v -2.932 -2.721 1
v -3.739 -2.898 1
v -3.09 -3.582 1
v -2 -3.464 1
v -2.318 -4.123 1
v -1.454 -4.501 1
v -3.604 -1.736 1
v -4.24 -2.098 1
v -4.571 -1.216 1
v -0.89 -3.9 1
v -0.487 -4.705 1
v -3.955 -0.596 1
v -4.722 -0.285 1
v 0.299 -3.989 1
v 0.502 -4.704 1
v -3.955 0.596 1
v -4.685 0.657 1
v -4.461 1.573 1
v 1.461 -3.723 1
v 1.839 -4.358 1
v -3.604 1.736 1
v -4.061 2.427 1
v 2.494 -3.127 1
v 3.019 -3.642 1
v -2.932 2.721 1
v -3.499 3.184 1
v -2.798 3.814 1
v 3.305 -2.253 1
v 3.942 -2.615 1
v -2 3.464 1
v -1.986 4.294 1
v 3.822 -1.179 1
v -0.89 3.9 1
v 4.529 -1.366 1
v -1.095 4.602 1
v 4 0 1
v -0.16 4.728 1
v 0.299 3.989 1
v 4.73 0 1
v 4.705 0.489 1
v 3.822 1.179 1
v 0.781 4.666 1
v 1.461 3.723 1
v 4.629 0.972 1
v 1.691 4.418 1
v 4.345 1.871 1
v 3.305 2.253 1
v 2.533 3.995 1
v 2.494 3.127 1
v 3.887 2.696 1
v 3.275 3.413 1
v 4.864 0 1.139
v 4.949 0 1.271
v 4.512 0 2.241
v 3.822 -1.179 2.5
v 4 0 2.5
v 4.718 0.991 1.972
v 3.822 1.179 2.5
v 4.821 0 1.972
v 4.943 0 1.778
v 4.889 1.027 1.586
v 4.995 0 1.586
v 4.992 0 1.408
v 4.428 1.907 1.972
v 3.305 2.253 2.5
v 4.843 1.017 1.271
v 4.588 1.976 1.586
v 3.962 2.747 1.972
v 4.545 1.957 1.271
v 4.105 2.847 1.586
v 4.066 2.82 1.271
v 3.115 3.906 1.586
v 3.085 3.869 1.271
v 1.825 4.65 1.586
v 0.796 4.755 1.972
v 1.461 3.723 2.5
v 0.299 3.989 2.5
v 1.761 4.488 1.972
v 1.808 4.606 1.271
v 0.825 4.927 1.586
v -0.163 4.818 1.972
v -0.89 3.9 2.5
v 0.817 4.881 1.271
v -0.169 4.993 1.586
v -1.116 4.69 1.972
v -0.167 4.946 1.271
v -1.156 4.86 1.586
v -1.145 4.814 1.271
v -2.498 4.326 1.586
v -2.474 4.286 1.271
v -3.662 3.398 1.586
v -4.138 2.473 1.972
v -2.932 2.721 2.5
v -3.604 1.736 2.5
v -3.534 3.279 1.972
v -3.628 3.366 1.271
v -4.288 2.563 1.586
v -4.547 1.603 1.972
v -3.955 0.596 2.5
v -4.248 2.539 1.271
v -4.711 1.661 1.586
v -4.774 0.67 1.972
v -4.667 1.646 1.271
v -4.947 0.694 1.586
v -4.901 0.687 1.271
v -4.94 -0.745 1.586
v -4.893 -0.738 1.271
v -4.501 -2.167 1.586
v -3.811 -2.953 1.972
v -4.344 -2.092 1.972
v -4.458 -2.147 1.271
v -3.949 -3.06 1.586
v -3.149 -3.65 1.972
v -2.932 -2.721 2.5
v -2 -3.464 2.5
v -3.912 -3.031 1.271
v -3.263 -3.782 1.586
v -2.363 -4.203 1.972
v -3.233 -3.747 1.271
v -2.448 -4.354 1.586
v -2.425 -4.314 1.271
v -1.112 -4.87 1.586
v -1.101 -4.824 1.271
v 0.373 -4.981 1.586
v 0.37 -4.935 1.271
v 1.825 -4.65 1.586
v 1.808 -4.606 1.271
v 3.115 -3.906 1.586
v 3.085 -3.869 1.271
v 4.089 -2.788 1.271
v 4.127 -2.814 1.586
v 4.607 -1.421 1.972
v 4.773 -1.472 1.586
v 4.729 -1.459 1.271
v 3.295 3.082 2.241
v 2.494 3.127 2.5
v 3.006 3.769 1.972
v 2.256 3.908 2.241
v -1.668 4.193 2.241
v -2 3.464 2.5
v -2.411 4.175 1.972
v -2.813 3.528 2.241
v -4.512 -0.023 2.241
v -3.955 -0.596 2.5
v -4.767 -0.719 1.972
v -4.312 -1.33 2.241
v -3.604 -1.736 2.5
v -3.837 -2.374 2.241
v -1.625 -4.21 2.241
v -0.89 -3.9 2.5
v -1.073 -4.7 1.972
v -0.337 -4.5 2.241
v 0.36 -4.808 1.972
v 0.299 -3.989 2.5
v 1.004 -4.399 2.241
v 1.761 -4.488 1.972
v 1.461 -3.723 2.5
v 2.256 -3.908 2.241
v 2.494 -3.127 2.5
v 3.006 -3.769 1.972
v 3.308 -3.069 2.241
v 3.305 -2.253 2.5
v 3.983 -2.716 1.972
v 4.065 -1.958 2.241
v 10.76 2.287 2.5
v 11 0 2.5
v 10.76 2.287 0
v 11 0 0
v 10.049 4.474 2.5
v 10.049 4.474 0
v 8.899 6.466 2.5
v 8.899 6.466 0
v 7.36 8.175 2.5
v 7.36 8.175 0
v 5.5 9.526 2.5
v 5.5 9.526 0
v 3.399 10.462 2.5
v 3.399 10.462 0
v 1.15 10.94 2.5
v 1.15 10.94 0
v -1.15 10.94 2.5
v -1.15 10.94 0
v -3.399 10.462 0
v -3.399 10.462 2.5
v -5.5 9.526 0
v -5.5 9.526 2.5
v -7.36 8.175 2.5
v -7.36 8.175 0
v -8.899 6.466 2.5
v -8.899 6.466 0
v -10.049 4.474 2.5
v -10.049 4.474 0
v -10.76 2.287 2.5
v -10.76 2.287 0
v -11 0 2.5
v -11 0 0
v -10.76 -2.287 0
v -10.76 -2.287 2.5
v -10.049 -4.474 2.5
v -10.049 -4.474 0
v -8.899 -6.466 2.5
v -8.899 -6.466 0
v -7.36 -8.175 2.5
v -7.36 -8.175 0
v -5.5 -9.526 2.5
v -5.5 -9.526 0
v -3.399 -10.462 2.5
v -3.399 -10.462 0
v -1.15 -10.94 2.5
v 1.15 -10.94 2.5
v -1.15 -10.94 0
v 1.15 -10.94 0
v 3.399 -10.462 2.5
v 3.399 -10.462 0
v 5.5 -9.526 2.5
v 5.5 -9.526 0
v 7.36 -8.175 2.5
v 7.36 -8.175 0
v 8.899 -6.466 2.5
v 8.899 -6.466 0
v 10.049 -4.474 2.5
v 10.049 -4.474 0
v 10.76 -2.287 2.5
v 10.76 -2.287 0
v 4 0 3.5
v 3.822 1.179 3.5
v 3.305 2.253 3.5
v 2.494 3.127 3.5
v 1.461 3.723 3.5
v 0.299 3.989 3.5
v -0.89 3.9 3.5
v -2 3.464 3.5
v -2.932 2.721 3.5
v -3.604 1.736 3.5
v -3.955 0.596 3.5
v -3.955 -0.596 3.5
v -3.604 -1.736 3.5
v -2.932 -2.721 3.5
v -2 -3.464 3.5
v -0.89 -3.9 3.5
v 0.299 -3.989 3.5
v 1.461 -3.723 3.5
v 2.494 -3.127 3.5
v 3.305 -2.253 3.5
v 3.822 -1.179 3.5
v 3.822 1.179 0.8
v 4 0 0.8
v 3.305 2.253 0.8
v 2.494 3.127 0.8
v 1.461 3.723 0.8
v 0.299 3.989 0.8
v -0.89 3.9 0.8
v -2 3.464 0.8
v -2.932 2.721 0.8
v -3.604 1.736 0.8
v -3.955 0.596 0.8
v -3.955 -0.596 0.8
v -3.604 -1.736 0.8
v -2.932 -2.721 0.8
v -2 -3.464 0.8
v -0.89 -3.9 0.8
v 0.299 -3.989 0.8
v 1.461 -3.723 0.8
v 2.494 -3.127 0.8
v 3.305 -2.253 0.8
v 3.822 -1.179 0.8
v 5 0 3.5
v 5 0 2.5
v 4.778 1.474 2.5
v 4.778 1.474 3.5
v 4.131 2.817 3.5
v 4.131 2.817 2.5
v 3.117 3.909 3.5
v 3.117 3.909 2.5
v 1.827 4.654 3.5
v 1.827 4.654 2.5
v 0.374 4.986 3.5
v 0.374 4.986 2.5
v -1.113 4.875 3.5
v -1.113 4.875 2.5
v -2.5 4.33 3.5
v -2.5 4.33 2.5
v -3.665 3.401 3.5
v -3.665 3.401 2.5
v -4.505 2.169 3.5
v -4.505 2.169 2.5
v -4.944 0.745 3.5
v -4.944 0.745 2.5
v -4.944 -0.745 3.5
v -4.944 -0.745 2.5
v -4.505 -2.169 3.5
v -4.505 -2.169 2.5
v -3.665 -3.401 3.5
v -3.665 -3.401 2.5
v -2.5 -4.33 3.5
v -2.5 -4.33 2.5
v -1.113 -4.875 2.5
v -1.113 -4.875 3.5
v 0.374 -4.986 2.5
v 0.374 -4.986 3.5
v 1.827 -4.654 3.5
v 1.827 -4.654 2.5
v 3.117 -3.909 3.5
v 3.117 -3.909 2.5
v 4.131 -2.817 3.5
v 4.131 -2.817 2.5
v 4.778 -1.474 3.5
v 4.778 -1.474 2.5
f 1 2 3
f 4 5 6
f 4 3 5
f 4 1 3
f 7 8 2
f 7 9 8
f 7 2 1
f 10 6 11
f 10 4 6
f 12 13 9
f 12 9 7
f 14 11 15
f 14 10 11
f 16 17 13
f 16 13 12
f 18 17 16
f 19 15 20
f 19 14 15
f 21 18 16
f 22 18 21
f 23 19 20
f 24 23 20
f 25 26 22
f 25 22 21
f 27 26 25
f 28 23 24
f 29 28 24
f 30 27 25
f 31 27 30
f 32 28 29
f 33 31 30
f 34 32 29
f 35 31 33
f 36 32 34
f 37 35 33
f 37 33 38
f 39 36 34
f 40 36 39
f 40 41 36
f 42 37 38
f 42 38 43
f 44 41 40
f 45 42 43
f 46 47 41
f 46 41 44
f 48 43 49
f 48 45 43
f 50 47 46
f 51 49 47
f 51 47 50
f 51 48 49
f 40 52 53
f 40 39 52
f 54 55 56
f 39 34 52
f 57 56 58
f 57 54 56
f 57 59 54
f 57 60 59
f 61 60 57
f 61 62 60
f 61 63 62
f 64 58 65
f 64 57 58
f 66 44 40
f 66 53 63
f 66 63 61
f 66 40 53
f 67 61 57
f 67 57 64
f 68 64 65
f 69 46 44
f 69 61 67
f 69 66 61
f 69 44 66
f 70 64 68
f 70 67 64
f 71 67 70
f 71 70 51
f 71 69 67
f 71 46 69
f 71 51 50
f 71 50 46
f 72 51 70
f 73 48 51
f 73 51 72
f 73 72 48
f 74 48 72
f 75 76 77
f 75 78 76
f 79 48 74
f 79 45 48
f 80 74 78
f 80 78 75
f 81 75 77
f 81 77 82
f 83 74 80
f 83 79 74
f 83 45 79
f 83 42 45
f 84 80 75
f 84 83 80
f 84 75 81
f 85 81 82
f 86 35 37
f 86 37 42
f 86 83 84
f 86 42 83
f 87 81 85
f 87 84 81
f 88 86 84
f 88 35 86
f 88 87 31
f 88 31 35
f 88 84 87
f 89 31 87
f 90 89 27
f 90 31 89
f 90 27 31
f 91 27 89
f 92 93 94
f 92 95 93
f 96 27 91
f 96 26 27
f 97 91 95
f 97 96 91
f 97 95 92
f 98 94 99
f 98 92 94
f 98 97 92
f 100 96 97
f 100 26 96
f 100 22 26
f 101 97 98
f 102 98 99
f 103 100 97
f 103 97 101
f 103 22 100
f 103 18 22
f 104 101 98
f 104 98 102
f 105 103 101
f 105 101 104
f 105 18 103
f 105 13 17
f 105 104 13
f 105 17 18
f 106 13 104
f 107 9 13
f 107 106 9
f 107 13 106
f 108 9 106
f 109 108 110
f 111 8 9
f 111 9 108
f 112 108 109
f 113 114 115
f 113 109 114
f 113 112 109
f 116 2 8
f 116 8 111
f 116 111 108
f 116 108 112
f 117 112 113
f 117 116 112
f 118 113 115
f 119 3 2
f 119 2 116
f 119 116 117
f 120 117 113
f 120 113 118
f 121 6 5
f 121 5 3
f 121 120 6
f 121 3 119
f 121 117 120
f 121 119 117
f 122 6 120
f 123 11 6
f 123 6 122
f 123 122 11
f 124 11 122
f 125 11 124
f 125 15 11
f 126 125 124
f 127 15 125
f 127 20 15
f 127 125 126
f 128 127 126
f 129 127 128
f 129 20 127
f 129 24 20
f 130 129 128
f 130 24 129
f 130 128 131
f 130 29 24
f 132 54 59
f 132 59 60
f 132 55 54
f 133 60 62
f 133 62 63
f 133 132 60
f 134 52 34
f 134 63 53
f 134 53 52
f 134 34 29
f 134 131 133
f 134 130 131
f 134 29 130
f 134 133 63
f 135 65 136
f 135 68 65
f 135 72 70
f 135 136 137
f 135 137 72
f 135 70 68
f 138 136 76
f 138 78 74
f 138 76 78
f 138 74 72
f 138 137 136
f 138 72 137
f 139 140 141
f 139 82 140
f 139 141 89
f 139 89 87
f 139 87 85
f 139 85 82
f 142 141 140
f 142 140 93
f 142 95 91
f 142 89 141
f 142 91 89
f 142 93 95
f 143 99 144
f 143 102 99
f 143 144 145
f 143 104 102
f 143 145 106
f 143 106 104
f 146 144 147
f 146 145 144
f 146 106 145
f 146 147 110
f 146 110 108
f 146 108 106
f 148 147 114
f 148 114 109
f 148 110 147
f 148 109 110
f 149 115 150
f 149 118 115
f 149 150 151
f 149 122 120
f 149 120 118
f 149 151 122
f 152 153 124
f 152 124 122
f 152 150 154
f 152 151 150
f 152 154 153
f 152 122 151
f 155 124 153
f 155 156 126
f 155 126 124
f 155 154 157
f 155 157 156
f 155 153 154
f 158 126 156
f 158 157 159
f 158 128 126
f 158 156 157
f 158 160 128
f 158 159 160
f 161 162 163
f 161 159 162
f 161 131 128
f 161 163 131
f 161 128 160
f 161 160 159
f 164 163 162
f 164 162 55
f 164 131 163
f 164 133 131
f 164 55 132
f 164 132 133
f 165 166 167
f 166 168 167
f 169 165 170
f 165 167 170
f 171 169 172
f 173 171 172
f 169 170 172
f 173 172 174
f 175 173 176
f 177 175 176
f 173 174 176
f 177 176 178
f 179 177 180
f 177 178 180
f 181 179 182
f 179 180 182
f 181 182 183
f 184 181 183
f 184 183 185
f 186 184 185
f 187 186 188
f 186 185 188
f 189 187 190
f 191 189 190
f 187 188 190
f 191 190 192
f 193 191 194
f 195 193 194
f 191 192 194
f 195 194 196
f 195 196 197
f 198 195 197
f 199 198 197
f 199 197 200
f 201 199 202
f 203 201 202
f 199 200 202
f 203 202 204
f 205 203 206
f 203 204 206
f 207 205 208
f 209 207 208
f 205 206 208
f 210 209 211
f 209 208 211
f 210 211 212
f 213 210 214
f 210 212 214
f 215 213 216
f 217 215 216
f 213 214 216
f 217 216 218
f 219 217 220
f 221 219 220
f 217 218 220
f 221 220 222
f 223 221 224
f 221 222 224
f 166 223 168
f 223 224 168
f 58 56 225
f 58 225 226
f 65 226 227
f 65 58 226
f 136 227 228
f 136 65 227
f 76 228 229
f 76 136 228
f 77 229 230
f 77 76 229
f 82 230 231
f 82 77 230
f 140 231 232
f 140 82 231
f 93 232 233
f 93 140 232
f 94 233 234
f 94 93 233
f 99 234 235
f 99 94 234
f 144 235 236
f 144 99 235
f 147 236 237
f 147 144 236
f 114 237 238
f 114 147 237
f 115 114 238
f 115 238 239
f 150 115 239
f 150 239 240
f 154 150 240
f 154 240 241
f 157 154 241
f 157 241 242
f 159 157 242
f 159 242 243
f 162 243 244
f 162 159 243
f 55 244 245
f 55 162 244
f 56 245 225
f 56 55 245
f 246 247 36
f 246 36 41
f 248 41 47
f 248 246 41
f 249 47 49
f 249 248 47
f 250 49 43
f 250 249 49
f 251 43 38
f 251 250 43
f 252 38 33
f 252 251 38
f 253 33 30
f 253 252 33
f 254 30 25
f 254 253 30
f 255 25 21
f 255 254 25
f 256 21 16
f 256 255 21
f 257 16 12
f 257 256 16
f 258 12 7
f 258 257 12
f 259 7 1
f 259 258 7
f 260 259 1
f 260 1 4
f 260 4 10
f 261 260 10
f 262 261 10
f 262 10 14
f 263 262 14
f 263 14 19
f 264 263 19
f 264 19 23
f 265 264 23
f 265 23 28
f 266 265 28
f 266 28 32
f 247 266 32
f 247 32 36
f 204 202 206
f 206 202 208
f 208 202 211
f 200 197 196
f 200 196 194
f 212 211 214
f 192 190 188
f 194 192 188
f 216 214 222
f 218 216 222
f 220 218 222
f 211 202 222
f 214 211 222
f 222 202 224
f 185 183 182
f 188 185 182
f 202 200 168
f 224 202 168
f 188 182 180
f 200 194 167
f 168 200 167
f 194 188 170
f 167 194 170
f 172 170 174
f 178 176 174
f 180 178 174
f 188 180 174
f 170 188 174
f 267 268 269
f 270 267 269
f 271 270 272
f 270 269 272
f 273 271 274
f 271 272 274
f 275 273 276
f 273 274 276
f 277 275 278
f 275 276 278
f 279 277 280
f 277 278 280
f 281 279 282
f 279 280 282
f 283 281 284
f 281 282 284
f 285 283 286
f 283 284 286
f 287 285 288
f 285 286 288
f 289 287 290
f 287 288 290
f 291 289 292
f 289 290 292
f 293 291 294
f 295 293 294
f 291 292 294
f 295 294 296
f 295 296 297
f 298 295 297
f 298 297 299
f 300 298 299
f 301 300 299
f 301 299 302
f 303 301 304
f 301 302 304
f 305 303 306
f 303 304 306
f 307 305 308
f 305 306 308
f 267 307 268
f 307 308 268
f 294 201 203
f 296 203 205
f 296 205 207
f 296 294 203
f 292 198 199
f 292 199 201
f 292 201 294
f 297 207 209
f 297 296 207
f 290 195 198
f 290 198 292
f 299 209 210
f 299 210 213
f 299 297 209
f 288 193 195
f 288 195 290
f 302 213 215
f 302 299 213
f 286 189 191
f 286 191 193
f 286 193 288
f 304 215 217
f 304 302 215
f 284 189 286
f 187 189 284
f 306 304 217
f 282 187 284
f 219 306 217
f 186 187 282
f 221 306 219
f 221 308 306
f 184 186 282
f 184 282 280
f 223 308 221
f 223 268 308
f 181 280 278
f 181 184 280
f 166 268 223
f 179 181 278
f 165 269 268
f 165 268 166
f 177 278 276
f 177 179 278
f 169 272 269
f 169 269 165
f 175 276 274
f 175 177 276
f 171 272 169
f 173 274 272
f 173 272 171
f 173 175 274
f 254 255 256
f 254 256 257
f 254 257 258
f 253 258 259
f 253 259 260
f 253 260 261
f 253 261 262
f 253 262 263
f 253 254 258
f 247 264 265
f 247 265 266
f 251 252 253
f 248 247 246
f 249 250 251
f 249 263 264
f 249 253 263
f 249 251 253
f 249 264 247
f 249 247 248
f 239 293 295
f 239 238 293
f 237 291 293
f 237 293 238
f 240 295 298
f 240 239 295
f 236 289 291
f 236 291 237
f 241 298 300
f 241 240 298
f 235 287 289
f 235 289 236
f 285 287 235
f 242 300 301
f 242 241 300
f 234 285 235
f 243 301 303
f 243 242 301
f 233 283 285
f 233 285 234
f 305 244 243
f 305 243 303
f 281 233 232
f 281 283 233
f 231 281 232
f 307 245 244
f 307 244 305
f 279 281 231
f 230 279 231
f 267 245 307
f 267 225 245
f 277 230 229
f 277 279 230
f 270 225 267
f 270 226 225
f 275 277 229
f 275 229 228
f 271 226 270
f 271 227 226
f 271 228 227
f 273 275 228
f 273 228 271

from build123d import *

# Parameters (mm, degrees)
F0_R     = 11
F0_R_2   = 4
F1_DEPTH = 2.5
F0_R_3   = 3.9
F2_DEPTH = 0.8
F5_R     = 5
F5_R_2   = 4
F6_DEPTH = 1


with BuildPart() as f1:
    # F0 (on Top) → F1 (new body)
    with BuildSketch(Plane.XY):
        Circle(F0_R)
        Circle(F0_R_2, mode=Mode.SUBTRACT)
    extrude(amount=F1_DEPTH)

    # F0 (on Top) → F2 (join)
    with BuildSketch(Plane.XY):
        Circle(F0_R_2)
        Circle(F0_R_3, mode=Mode.SUBTRACT)
        Circle(F0_R_3)
    extrude(amount=F2_DEPTH)

    # F3 (on Front) → F4 (revolve, cut)
    with BuildSketch(Plane.XZ):
        with BuildLine():
            add(Edge.make_bspline(
                [(4, 2.5), (4.80237, 2.181631), (5.20459, 1.426604), (4.788445, 0.966279), (4, 0.5)],
                knots=[0, 0, 0, 0, 1.41393, 2.828427, 2.828427, 2.828427, 2.828427], degree=3))
            Line((4, 2.5), (4, 0.5))
        make_face()
    revolve(axis=Axis((0, 0, 1.641661), (0, 0, 1)), mode=Mode.SUBTRACT)

    # F5 (on face) + F0 (on Top) → F6 (join)
    with BuildSketch(Plane.XY.offset(2.5)):
        Circle(F5_R)
        Circle(F5_R_2, mode=Mode.SUBTRACT)
    with BuildSketch(Plane.XY):
        Circle(F0_R)
        Circle(F0_R_2, mode=Mode.SUBTRACT)
    extrude(amount=F6_DEPTH)


solid = f1.part
